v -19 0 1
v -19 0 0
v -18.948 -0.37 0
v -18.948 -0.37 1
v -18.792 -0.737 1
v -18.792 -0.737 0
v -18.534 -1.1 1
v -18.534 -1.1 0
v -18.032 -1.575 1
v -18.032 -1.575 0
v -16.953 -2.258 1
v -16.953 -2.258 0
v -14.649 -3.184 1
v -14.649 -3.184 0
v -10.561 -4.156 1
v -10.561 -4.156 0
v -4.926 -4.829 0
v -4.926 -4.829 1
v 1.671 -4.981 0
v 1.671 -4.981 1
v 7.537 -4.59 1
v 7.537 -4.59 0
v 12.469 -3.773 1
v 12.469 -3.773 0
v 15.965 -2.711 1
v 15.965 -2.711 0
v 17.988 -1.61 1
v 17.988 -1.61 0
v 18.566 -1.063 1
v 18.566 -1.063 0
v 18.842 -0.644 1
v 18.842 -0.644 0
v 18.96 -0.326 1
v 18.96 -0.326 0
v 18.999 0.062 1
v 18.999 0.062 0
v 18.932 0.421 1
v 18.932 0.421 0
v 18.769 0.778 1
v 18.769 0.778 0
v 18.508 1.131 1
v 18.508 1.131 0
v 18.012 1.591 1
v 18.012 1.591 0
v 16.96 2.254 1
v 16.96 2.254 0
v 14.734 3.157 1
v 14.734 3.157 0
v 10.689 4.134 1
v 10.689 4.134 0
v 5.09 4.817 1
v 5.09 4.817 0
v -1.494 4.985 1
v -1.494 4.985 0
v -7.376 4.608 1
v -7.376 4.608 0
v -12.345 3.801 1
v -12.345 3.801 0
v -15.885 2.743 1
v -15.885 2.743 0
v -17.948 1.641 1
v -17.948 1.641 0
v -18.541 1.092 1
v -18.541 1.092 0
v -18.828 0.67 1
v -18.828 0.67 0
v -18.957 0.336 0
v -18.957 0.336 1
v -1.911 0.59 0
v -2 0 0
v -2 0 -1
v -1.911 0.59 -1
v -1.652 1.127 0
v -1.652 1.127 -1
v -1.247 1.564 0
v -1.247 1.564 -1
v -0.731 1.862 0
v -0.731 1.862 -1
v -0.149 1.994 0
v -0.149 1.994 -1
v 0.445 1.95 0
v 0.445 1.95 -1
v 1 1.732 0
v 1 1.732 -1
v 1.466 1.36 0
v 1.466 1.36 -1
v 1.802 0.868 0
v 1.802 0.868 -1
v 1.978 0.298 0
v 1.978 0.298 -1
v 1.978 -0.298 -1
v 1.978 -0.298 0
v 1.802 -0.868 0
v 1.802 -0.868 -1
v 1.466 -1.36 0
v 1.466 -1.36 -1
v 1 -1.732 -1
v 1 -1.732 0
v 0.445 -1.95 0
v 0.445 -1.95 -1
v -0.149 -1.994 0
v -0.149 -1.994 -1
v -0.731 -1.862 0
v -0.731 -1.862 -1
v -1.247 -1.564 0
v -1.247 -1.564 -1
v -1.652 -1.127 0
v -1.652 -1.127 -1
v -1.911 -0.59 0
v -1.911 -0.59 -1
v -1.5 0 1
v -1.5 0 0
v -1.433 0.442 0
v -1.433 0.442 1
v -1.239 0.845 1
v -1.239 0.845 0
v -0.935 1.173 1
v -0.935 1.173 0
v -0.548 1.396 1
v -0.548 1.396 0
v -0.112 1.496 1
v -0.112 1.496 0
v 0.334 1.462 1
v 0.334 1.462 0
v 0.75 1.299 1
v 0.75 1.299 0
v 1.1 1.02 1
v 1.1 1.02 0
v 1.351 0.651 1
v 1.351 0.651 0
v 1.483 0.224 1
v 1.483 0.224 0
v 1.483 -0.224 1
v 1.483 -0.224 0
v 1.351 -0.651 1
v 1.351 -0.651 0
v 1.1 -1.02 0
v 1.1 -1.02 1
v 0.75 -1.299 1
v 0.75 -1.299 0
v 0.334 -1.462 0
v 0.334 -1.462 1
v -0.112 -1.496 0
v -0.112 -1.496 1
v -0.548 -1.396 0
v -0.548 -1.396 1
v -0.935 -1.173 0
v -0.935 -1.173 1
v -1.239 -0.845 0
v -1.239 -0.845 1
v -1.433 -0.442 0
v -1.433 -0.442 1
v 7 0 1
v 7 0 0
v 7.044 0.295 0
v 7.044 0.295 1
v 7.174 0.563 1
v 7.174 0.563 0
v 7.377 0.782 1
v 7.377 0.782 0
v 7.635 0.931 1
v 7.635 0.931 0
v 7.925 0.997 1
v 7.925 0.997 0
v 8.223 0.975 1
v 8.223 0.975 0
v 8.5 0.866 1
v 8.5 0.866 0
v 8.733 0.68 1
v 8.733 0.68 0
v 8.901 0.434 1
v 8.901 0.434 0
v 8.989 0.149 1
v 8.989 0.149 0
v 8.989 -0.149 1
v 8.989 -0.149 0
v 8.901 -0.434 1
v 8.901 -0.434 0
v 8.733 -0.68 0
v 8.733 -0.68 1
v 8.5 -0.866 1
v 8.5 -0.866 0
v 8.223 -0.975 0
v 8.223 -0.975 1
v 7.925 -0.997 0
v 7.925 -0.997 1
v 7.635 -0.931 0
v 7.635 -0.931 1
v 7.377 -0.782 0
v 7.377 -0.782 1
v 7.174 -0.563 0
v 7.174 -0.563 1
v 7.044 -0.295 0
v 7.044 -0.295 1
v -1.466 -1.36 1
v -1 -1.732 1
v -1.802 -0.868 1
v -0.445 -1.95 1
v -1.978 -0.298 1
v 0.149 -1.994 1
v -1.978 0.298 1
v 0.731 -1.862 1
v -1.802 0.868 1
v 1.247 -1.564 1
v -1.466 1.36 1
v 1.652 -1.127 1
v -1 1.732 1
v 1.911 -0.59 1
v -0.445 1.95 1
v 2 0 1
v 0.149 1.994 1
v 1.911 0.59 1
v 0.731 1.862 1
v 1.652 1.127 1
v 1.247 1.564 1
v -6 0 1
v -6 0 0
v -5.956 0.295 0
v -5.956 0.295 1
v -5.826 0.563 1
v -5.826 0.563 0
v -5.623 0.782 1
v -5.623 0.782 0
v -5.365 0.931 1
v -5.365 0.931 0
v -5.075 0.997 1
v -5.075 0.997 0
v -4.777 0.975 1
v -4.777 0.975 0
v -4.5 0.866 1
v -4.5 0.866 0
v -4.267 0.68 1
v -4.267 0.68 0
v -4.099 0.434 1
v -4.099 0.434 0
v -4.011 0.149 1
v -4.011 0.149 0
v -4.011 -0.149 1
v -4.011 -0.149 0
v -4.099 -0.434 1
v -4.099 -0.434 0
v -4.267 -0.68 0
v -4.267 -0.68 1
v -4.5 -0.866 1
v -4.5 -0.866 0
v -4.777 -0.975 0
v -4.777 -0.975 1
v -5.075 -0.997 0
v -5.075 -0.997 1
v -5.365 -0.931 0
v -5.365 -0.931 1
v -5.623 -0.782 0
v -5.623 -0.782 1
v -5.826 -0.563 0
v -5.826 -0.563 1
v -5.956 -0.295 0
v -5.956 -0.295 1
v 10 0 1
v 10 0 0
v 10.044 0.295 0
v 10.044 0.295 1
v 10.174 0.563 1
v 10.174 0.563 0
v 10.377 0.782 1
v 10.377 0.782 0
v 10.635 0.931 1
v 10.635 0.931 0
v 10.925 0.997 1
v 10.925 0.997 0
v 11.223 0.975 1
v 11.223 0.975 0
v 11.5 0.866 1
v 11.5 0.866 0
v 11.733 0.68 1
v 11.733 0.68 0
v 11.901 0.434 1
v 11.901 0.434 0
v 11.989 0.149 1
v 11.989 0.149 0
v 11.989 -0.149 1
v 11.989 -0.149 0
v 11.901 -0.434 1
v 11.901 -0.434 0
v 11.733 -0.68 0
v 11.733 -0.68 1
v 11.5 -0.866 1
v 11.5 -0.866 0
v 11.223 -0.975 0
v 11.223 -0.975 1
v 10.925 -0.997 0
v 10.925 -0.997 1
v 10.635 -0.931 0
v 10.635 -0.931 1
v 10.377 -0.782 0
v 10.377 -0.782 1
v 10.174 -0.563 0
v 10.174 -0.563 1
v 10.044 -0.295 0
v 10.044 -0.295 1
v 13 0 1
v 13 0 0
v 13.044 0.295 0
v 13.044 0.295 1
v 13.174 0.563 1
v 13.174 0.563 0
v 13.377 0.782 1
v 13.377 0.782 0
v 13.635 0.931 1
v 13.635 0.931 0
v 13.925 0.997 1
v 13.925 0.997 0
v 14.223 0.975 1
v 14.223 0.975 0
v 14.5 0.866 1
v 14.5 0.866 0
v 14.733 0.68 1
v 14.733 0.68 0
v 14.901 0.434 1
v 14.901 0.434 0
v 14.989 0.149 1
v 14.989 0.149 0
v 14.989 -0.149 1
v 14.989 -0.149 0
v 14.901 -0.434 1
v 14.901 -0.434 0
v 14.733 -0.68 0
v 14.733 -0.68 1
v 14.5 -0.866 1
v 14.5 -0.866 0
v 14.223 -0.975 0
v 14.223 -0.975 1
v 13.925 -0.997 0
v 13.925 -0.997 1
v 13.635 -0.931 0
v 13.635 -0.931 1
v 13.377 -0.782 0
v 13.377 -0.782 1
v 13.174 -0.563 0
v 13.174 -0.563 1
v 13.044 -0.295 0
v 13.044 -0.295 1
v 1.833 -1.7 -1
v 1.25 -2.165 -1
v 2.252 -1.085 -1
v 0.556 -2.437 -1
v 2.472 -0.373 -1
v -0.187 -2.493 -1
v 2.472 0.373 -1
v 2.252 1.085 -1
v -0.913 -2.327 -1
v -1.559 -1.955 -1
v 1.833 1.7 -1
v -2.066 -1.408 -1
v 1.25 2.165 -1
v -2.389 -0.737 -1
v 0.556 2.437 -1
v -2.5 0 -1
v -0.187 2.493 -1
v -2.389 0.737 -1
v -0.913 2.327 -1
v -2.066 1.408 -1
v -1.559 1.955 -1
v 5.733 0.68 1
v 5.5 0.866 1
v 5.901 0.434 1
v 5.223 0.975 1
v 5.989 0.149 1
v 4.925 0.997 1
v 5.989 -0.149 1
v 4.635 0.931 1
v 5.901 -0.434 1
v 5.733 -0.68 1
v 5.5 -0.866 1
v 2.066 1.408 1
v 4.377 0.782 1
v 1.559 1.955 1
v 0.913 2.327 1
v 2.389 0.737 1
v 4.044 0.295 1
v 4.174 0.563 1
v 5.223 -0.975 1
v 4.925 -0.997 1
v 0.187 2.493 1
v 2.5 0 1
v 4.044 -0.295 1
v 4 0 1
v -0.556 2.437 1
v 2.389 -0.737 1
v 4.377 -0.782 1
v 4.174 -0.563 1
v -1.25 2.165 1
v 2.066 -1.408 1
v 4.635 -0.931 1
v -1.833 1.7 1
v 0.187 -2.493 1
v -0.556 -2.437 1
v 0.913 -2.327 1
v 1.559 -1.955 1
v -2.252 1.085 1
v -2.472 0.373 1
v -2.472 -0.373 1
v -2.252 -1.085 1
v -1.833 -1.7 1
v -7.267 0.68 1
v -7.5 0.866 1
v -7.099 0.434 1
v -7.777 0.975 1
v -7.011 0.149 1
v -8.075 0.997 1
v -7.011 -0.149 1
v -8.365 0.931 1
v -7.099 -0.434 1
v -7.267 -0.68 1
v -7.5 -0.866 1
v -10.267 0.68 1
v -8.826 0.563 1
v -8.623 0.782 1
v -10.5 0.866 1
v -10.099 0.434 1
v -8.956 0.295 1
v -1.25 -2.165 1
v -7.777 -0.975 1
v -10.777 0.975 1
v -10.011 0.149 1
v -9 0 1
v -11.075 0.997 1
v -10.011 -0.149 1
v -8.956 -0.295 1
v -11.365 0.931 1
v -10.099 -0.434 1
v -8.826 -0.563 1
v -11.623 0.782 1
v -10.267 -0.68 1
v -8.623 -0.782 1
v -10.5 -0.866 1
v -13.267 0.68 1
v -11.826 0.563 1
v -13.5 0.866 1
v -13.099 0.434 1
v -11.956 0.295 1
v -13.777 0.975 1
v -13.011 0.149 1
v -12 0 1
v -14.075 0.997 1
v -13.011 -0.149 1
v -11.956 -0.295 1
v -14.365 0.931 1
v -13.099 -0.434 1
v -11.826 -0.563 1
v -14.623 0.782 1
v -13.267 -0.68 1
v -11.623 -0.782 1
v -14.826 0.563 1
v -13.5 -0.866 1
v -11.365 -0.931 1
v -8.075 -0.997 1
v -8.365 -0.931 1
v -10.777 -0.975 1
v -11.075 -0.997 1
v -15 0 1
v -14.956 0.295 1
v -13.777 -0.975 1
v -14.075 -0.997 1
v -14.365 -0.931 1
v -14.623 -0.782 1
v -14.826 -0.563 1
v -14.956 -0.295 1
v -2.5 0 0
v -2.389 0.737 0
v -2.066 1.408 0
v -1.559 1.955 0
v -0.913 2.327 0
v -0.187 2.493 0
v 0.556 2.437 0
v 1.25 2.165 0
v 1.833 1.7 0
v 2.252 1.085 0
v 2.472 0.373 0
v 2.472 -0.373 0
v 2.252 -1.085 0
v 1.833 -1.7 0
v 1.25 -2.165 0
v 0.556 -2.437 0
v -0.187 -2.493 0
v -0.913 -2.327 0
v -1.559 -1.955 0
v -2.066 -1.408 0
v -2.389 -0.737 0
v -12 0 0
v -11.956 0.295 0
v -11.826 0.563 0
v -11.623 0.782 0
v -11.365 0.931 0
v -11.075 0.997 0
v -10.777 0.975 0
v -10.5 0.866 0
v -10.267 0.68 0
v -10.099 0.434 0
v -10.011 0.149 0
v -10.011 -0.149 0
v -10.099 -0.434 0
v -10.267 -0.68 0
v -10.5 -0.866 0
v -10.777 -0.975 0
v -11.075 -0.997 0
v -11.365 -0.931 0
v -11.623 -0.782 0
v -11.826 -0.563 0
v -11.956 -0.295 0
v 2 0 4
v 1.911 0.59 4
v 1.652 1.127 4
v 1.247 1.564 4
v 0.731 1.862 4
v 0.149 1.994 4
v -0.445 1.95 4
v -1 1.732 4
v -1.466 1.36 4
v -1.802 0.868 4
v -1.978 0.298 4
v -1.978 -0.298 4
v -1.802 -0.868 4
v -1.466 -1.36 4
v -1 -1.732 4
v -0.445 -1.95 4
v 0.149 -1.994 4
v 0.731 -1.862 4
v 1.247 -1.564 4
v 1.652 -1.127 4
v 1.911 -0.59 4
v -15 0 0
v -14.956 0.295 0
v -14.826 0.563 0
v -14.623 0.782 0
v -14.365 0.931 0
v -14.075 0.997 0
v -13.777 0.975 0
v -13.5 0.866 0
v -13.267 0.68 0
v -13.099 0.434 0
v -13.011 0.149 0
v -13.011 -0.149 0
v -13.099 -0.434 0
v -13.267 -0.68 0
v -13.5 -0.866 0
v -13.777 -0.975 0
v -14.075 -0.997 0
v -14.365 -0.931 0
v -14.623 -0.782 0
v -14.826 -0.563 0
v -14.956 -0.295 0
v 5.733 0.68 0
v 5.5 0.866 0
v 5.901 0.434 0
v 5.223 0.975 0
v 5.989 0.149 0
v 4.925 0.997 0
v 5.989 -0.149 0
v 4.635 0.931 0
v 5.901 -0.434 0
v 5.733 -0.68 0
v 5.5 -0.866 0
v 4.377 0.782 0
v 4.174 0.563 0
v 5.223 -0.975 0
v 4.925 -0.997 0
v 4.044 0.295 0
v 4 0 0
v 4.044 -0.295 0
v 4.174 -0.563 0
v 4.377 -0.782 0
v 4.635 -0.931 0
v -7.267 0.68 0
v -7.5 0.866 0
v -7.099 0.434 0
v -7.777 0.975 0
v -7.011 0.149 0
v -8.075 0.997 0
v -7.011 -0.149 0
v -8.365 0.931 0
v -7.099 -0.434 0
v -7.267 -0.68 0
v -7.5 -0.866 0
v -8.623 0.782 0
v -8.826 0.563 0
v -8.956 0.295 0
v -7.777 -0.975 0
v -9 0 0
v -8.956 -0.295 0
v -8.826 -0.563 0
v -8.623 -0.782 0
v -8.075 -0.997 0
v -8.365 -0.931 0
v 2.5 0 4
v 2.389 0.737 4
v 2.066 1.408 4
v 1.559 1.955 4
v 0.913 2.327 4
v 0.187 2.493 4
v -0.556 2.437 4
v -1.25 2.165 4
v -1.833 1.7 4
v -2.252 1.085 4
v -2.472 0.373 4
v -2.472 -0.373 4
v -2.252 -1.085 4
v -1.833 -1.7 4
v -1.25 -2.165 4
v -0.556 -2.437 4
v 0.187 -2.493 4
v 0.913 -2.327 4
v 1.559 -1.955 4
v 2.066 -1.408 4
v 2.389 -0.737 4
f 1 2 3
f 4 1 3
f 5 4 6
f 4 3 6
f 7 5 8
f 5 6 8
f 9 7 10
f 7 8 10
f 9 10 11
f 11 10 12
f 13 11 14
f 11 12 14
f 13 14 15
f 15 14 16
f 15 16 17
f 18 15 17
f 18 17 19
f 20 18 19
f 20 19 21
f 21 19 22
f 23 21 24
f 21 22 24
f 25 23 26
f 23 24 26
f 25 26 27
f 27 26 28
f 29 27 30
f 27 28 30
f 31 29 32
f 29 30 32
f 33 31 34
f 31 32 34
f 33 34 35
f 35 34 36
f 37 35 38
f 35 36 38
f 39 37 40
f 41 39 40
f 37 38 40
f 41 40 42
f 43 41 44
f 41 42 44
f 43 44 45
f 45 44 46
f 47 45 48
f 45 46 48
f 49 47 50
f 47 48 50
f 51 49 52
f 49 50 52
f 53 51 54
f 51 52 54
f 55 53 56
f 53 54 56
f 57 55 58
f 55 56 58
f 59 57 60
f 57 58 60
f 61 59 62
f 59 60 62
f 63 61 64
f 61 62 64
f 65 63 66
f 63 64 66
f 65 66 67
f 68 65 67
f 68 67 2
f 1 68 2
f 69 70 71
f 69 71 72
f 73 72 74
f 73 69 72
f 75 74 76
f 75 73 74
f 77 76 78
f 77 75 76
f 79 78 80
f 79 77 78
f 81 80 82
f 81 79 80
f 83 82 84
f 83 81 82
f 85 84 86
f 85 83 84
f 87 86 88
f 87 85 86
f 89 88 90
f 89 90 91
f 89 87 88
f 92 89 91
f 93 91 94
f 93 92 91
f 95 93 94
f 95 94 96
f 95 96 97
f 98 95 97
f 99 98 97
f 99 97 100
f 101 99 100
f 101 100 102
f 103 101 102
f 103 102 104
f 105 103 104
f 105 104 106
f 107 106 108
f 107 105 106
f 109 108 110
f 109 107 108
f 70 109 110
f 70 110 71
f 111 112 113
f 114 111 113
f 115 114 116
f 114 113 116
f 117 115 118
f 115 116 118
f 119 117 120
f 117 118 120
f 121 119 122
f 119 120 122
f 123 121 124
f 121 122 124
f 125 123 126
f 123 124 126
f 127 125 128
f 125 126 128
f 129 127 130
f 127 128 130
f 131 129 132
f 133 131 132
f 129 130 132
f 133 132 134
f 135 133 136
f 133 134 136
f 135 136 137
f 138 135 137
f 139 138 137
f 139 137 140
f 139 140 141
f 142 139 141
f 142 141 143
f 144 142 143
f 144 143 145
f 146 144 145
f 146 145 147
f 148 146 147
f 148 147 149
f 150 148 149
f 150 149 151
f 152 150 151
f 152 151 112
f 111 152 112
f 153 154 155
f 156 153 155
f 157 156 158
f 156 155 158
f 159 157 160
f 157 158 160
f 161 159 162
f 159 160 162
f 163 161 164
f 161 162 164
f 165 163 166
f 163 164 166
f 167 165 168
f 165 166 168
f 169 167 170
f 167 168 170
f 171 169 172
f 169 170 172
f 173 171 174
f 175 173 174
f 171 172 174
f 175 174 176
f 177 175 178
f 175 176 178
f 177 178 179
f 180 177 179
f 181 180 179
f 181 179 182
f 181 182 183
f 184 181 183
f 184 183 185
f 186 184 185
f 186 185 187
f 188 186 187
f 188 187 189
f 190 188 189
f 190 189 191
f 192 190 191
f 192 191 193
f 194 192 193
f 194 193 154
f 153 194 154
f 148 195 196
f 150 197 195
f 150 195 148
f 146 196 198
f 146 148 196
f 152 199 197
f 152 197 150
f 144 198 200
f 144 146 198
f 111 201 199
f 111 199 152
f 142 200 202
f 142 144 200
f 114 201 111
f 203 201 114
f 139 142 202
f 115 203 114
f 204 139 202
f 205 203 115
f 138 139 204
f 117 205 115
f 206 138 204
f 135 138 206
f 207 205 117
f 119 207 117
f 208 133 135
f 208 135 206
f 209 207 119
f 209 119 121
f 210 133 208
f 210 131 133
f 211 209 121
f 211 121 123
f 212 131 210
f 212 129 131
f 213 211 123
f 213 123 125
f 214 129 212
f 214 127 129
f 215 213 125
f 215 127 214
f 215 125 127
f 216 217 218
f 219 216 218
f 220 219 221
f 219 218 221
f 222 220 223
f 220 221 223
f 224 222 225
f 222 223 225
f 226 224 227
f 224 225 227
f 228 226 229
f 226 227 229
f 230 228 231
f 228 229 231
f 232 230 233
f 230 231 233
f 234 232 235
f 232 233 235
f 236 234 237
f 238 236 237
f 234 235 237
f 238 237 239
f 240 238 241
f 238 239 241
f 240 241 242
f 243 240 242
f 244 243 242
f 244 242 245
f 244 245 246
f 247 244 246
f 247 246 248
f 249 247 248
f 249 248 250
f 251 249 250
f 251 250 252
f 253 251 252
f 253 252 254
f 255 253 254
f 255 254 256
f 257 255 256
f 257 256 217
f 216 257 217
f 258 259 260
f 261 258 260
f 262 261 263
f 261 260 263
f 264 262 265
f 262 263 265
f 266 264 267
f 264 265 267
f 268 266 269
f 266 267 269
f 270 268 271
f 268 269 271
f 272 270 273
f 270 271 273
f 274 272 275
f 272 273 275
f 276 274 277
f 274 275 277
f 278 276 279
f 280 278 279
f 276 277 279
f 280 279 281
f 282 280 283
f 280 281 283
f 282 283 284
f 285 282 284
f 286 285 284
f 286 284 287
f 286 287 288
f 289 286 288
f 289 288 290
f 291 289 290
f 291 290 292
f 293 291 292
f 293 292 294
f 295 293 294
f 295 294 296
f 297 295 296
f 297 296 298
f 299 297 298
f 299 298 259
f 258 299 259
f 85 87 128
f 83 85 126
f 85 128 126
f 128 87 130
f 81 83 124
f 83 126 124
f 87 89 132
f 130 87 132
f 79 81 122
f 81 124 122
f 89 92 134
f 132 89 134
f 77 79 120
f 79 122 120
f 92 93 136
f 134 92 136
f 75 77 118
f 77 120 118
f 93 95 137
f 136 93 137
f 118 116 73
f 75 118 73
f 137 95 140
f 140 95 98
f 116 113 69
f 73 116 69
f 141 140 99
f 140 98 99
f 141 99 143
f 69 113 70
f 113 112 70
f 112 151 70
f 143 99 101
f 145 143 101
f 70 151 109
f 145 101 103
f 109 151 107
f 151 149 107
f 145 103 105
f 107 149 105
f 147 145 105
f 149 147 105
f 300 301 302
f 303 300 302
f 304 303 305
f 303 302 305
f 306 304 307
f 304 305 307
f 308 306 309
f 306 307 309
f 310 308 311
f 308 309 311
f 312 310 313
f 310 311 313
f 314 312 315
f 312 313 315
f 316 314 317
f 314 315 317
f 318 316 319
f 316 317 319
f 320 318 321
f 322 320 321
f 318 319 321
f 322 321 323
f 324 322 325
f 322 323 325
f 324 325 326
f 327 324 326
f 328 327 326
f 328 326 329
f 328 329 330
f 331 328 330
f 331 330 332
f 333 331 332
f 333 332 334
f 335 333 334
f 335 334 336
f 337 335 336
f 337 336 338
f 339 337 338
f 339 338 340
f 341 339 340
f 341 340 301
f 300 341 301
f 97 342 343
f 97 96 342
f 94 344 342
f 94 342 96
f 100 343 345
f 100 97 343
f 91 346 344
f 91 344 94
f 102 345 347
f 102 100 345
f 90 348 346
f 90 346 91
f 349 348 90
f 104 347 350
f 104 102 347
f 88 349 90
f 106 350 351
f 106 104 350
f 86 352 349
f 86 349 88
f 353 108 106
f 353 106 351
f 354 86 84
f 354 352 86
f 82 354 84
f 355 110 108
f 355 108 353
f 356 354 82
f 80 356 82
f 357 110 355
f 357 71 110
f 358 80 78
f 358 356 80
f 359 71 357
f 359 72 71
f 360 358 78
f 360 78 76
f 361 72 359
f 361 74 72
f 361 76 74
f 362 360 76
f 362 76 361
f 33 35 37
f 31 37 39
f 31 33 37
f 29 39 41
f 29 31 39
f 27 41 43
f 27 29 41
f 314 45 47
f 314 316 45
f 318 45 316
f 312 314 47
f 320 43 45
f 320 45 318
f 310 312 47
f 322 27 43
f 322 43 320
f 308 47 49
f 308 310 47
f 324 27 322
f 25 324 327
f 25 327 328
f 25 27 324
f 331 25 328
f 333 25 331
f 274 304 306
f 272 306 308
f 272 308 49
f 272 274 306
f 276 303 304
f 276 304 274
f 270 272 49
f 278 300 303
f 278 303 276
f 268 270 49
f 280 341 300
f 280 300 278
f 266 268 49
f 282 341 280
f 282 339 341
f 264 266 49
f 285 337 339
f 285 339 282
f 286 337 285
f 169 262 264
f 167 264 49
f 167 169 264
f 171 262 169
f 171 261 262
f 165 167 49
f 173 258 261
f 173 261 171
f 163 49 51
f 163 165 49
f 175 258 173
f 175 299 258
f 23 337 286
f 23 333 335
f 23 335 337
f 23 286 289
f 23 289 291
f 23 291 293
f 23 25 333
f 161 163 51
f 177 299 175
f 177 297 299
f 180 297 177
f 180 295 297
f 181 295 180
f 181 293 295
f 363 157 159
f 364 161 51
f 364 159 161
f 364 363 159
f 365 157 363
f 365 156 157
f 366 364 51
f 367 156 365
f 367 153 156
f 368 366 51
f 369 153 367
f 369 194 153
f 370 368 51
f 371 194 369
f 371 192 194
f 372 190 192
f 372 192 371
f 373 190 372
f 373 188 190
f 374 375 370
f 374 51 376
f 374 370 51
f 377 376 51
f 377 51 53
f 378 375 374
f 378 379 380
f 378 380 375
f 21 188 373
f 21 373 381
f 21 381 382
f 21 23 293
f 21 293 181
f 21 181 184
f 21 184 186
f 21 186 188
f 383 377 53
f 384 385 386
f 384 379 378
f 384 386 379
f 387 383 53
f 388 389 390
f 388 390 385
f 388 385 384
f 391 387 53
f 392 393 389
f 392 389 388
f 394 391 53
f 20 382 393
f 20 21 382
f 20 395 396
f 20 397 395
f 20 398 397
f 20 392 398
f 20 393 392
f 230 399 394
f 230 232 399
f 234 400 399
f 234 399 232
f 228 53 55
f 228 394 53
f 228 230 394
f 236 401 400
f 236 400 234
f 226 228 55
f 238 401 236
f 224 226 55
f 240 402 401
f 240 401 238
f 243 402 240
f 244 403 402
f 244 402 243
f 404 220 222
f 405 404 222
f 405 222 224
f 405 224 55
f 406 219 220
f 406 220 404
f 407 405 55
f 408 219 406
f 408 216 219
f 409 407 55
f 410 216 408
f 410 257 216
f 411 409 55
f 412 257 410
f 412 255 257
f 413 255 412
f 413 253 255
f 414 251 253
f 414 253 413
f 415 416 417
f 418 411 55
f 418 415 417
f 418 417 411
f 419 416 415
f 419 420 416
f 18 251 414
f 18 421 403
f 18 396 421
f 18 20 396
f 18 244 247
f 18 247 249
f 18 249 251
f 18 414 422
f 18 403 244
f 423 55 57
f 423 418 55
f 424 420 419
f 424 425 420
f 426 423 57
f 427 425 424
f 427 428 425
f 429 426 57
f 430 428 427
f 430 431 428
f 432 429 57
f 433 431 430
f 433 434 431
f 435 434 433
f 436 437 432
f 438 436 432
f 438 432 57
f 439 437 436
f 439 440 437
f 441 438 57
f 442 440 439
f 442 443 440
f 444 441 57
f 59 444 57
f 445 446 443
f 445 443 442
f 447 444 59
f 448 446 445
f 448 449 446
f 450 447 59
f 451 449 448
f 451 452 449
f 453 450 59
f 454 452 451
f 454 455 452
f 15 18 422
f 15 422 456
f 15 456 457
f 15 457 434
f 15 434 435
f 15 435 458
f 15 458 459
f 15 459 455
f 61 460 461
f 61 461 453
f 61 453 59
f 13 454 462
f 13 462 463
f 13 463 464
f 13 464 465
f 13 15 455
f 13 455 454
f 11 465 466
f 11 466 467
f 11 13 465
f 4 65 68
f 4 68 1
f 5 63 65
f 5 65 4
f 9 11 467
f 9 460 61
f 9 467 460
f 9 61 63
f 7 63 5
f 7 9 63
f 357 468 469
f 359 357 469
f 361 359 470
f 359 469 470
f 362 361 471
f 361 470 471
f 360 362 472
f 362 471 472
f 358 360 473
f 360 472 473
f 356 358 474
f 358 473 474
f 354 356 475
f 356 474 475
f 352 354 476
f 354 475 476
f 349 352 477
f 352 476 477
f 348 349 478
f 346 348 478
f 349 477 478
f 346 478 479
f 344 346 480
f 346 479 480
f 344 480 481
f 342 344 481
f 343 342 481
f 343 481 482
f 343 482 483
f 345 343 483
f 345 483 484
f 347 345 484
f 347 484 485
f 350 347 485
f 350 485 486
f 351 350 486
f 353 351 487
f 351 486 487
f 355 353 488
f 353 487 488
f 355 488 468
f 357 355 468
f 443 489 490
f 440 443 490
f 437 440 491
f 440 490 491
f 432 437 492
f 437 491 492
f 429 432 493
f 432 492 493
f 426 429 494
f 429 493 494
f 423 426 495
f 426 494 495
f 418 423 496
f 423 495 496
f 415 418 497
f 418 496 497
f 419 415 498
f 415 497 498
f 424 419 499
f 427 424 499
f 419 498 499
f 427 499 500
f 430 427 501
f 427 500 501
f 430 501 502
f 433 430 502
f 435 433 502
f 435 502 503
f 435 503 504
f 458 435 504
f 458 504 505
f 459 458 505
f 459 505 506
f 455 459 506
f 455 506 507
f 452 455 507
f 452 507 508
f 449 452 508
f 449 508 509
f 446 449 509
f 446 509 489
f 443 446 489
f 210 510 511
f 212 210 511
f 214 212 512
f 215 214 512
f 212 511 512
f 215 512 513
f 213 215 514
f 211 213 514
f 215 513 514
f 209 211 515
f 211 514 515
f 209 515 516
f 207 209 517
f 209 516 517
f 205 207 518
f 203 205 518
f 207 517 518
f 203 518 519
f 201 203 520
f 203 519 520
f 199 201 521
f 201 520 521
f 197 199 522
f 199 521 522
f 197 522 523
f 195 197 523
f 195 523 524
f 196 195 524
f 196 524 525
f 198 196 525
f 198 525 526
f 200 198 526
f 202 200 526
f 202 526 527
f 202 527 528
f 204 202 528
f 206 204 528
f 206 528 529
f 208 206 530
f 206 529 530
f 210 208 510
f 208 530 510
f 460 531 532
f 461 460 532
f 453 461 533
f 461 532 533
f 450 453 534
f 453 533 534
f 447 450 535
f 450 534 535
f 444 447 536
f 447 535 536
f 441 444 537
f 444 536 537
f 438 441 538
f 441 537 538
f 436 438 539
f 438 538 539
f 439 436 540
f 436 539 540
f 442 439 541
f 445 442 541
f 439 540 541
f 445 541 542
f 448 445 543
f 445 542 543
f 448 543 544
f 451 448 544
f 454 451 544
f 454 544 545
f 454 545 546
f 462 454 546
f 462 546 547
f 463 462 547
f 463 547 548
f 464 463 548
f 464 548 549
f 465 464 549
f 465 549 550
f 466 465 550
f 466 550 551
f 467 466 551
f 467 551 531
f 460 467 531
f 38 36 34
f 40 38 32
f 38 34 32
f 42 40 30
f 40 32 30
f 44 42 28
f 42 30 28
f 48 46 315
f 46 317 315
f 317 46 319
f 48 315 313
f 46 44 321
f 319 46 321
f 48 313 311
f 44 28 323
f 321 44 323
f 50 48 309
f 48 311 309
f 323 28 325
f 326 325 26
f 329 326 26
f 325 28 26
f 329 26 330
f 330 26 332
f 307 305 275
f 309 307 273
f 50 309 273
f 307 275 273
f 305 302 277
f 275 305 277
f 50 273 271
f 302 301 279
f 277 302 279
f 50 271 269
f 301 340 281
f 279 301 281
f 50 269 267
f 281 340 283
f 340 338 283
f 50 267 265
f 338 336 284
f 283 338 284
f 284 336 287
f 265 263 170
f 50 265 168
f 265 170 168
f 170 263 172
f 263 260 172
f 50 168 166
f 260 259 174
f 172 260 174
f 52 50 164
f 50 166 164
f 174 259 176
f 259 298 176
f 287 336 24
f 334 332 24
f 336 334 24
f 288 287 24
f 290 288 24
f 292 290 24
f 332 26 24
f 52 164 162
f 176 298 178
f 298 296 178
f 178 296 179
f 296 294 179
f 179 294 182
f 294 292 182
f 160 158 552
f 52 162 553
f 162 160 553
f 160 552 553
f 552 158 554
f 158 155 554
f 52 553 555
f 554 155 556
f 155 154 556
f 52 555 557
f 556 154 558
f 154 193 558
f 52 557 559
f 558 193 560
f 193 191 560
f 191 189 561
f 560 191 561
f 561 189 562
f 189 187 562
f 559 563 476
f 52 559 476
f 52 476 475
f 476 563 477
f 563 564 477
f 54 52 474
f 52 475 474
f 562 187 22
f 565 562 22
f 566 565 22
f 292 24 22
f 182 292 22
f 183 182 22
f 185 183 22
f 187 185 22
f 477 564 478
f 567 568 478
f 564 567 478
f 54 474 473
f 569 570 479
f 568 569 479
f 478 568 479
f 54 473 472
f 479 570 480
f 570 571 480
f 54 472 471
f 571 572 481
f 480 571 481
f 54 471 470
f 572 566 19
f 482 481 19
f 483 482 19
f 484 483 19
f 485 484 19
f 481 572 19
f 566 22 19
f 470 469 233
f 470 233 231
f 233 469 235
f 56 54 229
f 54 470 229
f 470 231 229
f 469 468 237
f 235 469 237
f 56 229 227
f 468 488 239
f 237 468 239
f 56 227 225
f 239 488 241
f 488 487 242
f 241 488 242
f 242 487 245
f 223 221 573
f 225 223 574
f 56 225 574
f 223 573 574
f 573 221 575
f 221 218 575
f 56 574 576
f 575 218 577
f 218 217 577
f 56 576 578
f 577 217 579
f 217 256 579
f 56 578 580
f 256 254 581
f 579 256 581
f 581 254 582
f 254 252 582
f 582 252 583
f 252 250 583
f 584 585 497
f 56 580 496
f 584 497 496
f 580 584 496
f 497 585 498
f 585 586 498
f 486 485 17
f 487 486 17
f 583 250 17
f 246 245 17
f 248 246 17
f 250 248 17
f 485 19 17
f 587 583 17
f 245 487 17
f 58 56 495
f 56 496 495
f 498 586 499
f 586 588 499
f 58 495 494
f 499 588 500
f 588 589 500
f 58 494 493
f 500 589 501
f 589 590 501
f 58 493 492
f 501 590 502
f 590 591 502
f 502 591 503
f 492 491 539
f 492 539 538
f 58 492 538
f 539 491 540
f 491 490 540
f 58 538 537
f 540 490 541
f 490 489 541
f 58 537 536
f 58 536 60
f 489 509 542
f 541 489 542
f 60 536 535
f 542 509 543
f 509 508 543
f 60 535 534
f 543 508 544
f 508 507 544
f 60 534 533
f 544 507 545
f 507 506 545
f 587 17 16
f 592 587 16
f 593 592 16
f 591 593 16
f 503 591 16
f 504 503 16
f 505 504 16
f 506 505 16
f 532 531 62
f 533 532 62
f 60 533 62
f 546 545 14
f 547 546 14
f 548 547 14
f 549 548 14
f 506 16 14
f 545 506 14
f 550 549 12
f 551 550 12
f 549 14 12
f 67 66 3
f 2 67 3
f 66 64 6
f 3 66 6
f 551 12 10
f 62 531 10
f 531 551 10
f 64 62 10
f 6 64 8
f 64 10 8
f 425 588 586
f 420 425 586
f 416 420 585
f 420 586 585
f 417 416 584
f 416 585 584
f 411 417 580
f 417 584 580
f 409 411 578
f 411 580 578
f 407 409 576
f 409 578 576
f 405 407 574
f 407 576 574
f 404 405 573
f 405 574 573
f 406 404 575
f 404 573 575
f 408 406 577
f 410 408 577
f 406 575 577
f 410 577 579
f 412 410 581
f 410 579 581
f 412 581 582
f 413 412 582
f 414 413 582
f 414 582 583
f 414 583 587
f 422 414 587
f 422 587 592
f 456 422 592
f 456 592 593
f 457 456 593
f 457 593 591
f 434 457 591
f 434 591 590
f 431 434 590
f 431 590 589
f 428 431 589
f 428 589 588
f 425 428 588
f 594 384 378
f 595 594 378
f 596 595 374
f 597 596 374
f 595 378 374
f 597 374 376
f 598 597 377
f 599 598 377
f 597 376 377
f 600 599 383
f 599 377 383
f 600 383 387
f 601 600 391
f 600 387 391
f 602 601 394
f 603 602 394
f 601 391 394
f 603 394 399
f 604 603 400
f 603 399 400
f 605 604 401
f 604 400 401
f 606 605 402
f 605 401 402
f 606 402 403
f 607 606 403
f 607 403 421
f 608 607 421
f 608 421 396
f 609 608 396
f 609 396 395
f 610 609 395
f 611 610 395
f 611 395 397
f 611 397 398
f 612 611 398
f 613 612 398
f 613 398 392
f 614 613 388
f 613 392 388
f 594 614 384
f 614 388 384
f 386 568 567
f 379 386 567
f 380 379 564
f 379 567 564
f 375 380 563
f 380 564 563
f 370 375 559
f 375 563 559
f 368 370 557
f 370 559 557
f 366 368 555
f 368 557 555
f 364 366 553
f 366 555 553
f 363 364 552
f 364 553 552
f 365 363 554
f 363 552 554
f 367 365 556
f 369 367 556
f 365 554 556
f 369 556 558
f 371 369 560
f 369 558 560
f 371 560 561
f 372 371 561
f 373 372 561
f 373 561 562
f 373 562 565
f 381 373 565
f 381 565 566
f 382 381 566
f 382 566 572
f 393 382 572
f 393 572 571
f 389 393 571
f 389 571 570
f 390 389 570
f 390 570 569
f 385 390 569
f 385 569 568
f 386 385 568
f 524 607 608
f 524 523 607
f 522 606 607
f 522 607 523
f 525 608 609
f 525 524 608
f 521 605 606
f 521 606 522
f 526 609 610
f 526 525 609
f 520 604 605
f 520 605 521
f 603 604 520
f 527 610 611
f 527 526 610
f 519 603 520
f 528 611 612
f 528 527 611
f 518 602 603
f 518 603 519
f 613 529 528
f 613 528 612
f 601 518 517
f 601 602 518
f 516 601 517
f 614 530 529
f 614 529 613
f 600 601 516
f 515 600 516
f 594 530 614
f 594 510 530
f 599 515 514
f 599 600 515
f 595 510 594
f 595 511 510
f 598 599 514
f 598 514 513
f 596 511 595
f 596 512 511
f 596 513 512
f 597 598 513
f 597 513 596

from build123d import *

# Parameters (mm, degrees)
SKETCH_1_RX         = 19
SKETCH_1_RY         = 5
EXTRUDE_1_DEPTH     = 1
SKETCH_2_R          = 2.5
EXTRUDE_2_DEPTH     = 3
SKETCH_3_R          = 1
CUT_EXTRUDE_1_DEPTH = 5
SKETCH_4_R          = 2
CUT_EXTRUDE_2_DEPTH = 3
SKETCH_5_R          = 1.5
CUT_EXTRUDE_3_DEPTH = 3
SKETCH_6_R          = 2.5
SKETCH_6_R_2        = 2
EXTRUDE_3_DEPTH     = 1


with BuildPart() as part:
    # 스케치1 → 보스-돌출1 (new body)
    with BuildSketch(Plane.XY):
        with Locations(Location((0, 0), (0, 0, 180))):
            Ellipse(SKETCH_1_RX, SKETCH_1_RY)
    extrude(amount=EXTRUDE_1_DEPTH)

    # 스케치2 → 보스-돌출2 (add)
    with BuildSketch(Plane.XY.offset(1)):
        Circle(SKETCH_2_R)
    extrude(amount=EXTRUDE_2_DEPTH)

    # 스케치3 → 컷-돌출1 (cut, through all)
    with BuildSketch(Plane(origin=(0, 0, 0), x_dir=(-1, 0, 0), z_dir=(0, 0, -1))):
        with Locations((-5, 0)):
            Circle(SKETCH_3_R)
        with Locations((-8, 0)):
            Circle(SKETCH_3_R)
        with Locations((-11, 0)):
            Circle(SKETCH_3_R)
        with Locations((-14, 0)):
            Circle(SKETCH_3_R)
        with Locations((14, 0)):
            Circle(SKETCH_3_R)
        with Locations((11, 0)):
            Circle(SKETCH_3_R)
        with Locations((8, 0)):
            Circle(SKETCH_3_R)
        with Locations((5, 0)):
            Circle(SKETCH_3_R)
    extrude(amount=-CUT_EXTRUDE_1_DEPTH, mode=Mode.SUBTRACT)

    # 스케치4 → 컷-돌출2 (cut)
    with BuildSketch(Plane.XY.offset(4)):
        Circle(SKETCH_4_R)
    extrude(amount=-CUT_EXTRUDE_2_DEPTH, mode=Mode.SUBTRACT)

    # 스케치5 → 컷-돌출3 (cut)
    with BuildSketch(Plane(origin=(0, 0, 0), x_dir=(-1, 0, 0), z_dir=(0, 0, -1))):
        Circle(SKETCH_5_R)
    extrude(amount=-CUT_EXTRUDE_3_DEPTH, mode=Mode.SUBTRACT)

    # 스케치6 → 보스-돌출3 (add)
    with BuildSketch(Plane(origin=(0, 0, 0), x_dir=(-1, 0, 0), z_dir=(0, 0, -1))):
        Circle(SKETCH_6_R)
        Circle(SKETCH_6_R_2, mode=Mode.SUBTRACT)
    extrude(amount=EXTRUDE_3_DEPTH)


solid = part.part
